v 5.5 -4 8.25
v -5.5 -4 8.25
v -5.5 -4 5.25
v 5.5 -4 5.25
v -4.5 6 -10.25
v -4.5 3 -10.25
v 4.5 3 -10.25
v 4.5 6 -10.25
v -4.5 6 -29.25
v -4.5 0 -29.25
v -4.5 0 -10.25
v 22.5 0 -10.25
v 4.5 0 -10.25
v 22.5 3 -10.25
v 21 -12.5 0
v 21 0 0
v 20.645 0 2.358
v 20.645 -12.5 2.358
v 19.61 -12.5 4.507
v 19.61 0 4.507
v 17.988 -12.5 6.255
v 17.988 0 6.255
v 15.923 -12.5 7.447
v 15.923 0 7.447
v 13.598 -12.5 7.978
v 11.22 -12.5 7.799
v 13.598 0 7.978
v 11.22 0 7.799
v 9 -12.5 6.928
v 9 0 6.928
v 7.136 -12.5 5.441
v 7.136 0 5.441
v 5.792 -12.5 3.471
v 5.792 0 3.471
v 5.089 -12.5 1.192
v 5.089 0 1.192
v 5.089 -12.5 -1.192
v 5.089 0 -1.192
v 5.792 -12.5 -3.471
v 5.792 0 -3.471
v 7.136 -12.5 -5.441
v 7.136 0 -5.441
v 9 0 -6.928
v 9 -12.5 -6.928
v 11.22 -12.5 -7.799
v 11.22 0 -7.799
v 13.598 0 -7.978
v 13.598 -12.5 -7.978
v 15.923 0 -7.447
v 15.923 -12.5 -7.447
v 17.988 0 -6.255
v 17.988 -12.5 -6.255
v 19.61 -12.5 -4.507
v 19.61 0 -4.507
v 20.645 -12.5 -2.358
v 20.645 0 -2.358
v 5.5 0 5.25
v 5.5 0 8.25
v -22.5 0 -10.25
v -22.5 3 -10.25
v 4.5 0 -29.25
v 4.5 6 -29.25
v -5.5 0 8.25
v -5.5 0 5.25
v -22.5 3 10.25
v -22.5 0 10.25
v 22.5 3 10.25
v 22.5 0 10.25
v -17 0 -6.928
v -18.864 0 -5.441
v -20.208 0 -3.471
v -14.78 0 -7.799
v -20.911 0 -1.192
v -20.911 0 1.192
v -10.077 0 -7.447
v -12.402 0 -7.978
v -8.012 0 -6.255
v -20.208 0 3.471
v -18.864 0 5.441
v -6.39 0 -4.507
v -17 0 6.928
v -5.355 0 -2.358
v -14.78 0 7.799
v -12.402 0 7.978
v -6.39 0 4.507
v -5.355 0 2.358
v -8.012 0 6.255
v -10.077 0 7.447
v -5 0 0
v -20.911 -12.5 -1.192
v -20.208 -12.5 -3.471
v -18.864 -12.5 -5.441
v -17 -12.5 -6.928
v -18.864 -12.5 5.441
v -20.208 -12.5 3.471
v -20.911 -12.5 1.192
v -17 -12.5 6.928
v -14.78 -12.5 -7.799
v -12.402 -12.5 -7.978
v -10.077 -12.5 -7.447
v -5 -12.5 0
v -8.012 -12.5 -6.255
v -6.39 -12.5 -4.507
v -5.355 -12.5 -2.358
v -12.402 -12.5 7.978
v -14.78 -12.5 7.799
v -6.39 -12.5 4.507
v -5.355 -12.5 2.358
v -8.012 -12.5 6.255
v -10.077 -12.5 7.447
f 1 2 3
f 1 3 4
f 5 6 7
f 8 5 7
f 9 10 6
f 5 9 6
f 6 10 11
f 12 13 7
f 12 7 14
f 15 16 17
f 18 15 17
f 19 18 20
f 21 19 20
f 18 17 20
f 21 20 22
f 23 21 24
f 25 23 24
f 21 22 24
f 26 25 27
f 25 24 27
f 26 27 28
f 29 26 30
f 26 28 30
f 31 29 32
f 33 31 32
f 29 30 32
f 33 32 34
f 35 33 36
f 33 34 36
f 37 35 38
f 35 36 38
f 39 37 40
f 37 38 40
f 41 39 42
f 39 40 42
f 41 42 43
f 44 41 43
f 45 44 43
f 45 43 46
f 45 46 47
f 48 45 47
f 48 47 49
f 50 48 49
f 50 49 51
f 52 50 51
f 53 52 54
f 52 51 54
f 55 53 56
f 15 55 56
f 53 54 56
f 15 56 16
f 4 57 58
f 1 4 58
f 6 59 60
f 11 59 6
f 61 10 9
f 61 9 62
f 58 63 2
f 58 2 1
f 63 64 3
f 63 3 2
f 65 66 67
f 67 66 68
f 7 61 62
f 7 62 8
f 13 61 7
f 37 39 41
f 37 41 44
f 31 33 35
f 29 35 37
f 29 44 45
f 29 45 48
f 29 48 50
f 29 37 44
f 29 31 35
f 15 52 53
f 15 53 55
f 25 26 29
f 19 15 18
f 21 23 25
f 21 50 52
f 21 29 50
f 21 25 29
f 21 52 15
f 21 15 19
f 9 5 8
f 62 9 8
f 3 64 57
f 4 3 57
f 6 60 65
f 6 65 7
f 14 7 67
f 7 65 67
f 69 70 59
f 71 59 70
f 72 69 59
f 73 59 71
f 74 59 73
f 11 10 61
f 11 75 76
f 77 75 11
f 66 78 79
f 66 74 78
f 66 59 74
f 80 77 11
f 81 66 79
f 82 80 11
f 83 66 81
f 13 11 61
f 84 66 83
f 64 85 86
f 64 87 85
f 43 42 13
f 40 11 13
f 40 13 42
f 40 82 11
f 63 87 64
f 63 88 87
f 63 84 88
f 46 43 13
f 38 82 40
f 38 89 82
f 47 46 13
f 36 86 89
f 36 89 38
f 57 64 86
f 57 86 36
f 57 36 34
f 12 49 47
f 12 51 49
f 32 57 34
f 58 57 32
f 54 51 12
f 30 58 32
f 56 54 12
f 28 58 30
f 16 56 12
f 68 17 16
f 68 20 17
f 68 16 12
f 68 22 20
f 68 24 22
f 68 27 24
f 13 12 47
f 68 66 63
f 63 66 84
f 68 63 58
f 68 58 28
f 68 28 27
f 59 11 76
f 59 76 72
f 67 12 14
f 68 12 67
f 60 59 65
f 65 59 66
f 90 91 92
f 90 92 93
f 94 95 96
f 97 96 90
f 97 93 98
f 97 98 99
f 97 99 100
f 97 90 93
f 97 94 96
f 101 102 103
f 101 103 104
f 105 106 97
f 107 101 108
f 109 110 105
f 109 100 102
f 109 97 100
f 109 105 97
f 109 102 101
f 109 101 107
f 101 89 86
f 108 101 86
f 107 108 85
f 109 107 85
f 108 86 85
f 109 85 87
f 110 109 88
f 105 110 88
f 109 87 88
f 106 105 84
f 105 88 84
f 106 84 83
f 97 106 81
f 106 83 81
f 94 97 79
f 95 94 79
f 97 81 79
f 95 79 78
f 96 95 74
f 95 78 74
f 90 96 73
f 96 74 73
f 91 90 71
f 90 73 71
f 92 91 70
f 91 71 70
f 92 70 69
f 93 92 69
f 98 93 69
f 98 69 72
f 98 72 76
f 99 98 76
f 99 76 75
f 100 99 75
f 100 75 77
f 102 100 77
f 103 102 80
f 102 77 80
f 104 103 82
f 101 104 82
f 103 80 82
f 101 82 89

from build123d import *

# Parameters (mm, degrees)
F0_W     = 45
F0_H     = 20.5
F1_DEPTH = 3
F2_R     = 8
F3_DEPTH = 12.5
F4_W     = 11
F4_H     = 3
F5_DEPTH = 4
F6_W     = 9
F6_H     = 19
F7_DEPTH = 6


with BuildPart() as f1:
    # F0 (on Front) → F1 (new body)
    with BuildSketch(Plane.XZ):
        Rectangle(F0_W, F0_H)
    extrude(amount=-F1_DEPTH)

    # F2 (on Front) → F3 (join)
    with BuildSketch(Plane.XZ):
        with Locations((-13, 0)):
            Circle(F2_R)
        with Locations((13, 0)):
            Circle(F2_R)
    extrude(amount=F3_DEPTH)

    # F4 (on Front) → F5 (join)
    with BuildSketch(Plane.XZ):
        with Locations((0, 6.75)):
            Rectangle(F4_W, F4_H)
    extrude(amount=F5_DEPTH)

    # F6 (on Front) → F7 (join)
    with BuildSketch(Plane.XZ):
        with Locations((0, -19.75)):
            Rectangle(F6_W, F6_H)
    extrude(amount=-F7_DEPTH)


solid = f1.part
